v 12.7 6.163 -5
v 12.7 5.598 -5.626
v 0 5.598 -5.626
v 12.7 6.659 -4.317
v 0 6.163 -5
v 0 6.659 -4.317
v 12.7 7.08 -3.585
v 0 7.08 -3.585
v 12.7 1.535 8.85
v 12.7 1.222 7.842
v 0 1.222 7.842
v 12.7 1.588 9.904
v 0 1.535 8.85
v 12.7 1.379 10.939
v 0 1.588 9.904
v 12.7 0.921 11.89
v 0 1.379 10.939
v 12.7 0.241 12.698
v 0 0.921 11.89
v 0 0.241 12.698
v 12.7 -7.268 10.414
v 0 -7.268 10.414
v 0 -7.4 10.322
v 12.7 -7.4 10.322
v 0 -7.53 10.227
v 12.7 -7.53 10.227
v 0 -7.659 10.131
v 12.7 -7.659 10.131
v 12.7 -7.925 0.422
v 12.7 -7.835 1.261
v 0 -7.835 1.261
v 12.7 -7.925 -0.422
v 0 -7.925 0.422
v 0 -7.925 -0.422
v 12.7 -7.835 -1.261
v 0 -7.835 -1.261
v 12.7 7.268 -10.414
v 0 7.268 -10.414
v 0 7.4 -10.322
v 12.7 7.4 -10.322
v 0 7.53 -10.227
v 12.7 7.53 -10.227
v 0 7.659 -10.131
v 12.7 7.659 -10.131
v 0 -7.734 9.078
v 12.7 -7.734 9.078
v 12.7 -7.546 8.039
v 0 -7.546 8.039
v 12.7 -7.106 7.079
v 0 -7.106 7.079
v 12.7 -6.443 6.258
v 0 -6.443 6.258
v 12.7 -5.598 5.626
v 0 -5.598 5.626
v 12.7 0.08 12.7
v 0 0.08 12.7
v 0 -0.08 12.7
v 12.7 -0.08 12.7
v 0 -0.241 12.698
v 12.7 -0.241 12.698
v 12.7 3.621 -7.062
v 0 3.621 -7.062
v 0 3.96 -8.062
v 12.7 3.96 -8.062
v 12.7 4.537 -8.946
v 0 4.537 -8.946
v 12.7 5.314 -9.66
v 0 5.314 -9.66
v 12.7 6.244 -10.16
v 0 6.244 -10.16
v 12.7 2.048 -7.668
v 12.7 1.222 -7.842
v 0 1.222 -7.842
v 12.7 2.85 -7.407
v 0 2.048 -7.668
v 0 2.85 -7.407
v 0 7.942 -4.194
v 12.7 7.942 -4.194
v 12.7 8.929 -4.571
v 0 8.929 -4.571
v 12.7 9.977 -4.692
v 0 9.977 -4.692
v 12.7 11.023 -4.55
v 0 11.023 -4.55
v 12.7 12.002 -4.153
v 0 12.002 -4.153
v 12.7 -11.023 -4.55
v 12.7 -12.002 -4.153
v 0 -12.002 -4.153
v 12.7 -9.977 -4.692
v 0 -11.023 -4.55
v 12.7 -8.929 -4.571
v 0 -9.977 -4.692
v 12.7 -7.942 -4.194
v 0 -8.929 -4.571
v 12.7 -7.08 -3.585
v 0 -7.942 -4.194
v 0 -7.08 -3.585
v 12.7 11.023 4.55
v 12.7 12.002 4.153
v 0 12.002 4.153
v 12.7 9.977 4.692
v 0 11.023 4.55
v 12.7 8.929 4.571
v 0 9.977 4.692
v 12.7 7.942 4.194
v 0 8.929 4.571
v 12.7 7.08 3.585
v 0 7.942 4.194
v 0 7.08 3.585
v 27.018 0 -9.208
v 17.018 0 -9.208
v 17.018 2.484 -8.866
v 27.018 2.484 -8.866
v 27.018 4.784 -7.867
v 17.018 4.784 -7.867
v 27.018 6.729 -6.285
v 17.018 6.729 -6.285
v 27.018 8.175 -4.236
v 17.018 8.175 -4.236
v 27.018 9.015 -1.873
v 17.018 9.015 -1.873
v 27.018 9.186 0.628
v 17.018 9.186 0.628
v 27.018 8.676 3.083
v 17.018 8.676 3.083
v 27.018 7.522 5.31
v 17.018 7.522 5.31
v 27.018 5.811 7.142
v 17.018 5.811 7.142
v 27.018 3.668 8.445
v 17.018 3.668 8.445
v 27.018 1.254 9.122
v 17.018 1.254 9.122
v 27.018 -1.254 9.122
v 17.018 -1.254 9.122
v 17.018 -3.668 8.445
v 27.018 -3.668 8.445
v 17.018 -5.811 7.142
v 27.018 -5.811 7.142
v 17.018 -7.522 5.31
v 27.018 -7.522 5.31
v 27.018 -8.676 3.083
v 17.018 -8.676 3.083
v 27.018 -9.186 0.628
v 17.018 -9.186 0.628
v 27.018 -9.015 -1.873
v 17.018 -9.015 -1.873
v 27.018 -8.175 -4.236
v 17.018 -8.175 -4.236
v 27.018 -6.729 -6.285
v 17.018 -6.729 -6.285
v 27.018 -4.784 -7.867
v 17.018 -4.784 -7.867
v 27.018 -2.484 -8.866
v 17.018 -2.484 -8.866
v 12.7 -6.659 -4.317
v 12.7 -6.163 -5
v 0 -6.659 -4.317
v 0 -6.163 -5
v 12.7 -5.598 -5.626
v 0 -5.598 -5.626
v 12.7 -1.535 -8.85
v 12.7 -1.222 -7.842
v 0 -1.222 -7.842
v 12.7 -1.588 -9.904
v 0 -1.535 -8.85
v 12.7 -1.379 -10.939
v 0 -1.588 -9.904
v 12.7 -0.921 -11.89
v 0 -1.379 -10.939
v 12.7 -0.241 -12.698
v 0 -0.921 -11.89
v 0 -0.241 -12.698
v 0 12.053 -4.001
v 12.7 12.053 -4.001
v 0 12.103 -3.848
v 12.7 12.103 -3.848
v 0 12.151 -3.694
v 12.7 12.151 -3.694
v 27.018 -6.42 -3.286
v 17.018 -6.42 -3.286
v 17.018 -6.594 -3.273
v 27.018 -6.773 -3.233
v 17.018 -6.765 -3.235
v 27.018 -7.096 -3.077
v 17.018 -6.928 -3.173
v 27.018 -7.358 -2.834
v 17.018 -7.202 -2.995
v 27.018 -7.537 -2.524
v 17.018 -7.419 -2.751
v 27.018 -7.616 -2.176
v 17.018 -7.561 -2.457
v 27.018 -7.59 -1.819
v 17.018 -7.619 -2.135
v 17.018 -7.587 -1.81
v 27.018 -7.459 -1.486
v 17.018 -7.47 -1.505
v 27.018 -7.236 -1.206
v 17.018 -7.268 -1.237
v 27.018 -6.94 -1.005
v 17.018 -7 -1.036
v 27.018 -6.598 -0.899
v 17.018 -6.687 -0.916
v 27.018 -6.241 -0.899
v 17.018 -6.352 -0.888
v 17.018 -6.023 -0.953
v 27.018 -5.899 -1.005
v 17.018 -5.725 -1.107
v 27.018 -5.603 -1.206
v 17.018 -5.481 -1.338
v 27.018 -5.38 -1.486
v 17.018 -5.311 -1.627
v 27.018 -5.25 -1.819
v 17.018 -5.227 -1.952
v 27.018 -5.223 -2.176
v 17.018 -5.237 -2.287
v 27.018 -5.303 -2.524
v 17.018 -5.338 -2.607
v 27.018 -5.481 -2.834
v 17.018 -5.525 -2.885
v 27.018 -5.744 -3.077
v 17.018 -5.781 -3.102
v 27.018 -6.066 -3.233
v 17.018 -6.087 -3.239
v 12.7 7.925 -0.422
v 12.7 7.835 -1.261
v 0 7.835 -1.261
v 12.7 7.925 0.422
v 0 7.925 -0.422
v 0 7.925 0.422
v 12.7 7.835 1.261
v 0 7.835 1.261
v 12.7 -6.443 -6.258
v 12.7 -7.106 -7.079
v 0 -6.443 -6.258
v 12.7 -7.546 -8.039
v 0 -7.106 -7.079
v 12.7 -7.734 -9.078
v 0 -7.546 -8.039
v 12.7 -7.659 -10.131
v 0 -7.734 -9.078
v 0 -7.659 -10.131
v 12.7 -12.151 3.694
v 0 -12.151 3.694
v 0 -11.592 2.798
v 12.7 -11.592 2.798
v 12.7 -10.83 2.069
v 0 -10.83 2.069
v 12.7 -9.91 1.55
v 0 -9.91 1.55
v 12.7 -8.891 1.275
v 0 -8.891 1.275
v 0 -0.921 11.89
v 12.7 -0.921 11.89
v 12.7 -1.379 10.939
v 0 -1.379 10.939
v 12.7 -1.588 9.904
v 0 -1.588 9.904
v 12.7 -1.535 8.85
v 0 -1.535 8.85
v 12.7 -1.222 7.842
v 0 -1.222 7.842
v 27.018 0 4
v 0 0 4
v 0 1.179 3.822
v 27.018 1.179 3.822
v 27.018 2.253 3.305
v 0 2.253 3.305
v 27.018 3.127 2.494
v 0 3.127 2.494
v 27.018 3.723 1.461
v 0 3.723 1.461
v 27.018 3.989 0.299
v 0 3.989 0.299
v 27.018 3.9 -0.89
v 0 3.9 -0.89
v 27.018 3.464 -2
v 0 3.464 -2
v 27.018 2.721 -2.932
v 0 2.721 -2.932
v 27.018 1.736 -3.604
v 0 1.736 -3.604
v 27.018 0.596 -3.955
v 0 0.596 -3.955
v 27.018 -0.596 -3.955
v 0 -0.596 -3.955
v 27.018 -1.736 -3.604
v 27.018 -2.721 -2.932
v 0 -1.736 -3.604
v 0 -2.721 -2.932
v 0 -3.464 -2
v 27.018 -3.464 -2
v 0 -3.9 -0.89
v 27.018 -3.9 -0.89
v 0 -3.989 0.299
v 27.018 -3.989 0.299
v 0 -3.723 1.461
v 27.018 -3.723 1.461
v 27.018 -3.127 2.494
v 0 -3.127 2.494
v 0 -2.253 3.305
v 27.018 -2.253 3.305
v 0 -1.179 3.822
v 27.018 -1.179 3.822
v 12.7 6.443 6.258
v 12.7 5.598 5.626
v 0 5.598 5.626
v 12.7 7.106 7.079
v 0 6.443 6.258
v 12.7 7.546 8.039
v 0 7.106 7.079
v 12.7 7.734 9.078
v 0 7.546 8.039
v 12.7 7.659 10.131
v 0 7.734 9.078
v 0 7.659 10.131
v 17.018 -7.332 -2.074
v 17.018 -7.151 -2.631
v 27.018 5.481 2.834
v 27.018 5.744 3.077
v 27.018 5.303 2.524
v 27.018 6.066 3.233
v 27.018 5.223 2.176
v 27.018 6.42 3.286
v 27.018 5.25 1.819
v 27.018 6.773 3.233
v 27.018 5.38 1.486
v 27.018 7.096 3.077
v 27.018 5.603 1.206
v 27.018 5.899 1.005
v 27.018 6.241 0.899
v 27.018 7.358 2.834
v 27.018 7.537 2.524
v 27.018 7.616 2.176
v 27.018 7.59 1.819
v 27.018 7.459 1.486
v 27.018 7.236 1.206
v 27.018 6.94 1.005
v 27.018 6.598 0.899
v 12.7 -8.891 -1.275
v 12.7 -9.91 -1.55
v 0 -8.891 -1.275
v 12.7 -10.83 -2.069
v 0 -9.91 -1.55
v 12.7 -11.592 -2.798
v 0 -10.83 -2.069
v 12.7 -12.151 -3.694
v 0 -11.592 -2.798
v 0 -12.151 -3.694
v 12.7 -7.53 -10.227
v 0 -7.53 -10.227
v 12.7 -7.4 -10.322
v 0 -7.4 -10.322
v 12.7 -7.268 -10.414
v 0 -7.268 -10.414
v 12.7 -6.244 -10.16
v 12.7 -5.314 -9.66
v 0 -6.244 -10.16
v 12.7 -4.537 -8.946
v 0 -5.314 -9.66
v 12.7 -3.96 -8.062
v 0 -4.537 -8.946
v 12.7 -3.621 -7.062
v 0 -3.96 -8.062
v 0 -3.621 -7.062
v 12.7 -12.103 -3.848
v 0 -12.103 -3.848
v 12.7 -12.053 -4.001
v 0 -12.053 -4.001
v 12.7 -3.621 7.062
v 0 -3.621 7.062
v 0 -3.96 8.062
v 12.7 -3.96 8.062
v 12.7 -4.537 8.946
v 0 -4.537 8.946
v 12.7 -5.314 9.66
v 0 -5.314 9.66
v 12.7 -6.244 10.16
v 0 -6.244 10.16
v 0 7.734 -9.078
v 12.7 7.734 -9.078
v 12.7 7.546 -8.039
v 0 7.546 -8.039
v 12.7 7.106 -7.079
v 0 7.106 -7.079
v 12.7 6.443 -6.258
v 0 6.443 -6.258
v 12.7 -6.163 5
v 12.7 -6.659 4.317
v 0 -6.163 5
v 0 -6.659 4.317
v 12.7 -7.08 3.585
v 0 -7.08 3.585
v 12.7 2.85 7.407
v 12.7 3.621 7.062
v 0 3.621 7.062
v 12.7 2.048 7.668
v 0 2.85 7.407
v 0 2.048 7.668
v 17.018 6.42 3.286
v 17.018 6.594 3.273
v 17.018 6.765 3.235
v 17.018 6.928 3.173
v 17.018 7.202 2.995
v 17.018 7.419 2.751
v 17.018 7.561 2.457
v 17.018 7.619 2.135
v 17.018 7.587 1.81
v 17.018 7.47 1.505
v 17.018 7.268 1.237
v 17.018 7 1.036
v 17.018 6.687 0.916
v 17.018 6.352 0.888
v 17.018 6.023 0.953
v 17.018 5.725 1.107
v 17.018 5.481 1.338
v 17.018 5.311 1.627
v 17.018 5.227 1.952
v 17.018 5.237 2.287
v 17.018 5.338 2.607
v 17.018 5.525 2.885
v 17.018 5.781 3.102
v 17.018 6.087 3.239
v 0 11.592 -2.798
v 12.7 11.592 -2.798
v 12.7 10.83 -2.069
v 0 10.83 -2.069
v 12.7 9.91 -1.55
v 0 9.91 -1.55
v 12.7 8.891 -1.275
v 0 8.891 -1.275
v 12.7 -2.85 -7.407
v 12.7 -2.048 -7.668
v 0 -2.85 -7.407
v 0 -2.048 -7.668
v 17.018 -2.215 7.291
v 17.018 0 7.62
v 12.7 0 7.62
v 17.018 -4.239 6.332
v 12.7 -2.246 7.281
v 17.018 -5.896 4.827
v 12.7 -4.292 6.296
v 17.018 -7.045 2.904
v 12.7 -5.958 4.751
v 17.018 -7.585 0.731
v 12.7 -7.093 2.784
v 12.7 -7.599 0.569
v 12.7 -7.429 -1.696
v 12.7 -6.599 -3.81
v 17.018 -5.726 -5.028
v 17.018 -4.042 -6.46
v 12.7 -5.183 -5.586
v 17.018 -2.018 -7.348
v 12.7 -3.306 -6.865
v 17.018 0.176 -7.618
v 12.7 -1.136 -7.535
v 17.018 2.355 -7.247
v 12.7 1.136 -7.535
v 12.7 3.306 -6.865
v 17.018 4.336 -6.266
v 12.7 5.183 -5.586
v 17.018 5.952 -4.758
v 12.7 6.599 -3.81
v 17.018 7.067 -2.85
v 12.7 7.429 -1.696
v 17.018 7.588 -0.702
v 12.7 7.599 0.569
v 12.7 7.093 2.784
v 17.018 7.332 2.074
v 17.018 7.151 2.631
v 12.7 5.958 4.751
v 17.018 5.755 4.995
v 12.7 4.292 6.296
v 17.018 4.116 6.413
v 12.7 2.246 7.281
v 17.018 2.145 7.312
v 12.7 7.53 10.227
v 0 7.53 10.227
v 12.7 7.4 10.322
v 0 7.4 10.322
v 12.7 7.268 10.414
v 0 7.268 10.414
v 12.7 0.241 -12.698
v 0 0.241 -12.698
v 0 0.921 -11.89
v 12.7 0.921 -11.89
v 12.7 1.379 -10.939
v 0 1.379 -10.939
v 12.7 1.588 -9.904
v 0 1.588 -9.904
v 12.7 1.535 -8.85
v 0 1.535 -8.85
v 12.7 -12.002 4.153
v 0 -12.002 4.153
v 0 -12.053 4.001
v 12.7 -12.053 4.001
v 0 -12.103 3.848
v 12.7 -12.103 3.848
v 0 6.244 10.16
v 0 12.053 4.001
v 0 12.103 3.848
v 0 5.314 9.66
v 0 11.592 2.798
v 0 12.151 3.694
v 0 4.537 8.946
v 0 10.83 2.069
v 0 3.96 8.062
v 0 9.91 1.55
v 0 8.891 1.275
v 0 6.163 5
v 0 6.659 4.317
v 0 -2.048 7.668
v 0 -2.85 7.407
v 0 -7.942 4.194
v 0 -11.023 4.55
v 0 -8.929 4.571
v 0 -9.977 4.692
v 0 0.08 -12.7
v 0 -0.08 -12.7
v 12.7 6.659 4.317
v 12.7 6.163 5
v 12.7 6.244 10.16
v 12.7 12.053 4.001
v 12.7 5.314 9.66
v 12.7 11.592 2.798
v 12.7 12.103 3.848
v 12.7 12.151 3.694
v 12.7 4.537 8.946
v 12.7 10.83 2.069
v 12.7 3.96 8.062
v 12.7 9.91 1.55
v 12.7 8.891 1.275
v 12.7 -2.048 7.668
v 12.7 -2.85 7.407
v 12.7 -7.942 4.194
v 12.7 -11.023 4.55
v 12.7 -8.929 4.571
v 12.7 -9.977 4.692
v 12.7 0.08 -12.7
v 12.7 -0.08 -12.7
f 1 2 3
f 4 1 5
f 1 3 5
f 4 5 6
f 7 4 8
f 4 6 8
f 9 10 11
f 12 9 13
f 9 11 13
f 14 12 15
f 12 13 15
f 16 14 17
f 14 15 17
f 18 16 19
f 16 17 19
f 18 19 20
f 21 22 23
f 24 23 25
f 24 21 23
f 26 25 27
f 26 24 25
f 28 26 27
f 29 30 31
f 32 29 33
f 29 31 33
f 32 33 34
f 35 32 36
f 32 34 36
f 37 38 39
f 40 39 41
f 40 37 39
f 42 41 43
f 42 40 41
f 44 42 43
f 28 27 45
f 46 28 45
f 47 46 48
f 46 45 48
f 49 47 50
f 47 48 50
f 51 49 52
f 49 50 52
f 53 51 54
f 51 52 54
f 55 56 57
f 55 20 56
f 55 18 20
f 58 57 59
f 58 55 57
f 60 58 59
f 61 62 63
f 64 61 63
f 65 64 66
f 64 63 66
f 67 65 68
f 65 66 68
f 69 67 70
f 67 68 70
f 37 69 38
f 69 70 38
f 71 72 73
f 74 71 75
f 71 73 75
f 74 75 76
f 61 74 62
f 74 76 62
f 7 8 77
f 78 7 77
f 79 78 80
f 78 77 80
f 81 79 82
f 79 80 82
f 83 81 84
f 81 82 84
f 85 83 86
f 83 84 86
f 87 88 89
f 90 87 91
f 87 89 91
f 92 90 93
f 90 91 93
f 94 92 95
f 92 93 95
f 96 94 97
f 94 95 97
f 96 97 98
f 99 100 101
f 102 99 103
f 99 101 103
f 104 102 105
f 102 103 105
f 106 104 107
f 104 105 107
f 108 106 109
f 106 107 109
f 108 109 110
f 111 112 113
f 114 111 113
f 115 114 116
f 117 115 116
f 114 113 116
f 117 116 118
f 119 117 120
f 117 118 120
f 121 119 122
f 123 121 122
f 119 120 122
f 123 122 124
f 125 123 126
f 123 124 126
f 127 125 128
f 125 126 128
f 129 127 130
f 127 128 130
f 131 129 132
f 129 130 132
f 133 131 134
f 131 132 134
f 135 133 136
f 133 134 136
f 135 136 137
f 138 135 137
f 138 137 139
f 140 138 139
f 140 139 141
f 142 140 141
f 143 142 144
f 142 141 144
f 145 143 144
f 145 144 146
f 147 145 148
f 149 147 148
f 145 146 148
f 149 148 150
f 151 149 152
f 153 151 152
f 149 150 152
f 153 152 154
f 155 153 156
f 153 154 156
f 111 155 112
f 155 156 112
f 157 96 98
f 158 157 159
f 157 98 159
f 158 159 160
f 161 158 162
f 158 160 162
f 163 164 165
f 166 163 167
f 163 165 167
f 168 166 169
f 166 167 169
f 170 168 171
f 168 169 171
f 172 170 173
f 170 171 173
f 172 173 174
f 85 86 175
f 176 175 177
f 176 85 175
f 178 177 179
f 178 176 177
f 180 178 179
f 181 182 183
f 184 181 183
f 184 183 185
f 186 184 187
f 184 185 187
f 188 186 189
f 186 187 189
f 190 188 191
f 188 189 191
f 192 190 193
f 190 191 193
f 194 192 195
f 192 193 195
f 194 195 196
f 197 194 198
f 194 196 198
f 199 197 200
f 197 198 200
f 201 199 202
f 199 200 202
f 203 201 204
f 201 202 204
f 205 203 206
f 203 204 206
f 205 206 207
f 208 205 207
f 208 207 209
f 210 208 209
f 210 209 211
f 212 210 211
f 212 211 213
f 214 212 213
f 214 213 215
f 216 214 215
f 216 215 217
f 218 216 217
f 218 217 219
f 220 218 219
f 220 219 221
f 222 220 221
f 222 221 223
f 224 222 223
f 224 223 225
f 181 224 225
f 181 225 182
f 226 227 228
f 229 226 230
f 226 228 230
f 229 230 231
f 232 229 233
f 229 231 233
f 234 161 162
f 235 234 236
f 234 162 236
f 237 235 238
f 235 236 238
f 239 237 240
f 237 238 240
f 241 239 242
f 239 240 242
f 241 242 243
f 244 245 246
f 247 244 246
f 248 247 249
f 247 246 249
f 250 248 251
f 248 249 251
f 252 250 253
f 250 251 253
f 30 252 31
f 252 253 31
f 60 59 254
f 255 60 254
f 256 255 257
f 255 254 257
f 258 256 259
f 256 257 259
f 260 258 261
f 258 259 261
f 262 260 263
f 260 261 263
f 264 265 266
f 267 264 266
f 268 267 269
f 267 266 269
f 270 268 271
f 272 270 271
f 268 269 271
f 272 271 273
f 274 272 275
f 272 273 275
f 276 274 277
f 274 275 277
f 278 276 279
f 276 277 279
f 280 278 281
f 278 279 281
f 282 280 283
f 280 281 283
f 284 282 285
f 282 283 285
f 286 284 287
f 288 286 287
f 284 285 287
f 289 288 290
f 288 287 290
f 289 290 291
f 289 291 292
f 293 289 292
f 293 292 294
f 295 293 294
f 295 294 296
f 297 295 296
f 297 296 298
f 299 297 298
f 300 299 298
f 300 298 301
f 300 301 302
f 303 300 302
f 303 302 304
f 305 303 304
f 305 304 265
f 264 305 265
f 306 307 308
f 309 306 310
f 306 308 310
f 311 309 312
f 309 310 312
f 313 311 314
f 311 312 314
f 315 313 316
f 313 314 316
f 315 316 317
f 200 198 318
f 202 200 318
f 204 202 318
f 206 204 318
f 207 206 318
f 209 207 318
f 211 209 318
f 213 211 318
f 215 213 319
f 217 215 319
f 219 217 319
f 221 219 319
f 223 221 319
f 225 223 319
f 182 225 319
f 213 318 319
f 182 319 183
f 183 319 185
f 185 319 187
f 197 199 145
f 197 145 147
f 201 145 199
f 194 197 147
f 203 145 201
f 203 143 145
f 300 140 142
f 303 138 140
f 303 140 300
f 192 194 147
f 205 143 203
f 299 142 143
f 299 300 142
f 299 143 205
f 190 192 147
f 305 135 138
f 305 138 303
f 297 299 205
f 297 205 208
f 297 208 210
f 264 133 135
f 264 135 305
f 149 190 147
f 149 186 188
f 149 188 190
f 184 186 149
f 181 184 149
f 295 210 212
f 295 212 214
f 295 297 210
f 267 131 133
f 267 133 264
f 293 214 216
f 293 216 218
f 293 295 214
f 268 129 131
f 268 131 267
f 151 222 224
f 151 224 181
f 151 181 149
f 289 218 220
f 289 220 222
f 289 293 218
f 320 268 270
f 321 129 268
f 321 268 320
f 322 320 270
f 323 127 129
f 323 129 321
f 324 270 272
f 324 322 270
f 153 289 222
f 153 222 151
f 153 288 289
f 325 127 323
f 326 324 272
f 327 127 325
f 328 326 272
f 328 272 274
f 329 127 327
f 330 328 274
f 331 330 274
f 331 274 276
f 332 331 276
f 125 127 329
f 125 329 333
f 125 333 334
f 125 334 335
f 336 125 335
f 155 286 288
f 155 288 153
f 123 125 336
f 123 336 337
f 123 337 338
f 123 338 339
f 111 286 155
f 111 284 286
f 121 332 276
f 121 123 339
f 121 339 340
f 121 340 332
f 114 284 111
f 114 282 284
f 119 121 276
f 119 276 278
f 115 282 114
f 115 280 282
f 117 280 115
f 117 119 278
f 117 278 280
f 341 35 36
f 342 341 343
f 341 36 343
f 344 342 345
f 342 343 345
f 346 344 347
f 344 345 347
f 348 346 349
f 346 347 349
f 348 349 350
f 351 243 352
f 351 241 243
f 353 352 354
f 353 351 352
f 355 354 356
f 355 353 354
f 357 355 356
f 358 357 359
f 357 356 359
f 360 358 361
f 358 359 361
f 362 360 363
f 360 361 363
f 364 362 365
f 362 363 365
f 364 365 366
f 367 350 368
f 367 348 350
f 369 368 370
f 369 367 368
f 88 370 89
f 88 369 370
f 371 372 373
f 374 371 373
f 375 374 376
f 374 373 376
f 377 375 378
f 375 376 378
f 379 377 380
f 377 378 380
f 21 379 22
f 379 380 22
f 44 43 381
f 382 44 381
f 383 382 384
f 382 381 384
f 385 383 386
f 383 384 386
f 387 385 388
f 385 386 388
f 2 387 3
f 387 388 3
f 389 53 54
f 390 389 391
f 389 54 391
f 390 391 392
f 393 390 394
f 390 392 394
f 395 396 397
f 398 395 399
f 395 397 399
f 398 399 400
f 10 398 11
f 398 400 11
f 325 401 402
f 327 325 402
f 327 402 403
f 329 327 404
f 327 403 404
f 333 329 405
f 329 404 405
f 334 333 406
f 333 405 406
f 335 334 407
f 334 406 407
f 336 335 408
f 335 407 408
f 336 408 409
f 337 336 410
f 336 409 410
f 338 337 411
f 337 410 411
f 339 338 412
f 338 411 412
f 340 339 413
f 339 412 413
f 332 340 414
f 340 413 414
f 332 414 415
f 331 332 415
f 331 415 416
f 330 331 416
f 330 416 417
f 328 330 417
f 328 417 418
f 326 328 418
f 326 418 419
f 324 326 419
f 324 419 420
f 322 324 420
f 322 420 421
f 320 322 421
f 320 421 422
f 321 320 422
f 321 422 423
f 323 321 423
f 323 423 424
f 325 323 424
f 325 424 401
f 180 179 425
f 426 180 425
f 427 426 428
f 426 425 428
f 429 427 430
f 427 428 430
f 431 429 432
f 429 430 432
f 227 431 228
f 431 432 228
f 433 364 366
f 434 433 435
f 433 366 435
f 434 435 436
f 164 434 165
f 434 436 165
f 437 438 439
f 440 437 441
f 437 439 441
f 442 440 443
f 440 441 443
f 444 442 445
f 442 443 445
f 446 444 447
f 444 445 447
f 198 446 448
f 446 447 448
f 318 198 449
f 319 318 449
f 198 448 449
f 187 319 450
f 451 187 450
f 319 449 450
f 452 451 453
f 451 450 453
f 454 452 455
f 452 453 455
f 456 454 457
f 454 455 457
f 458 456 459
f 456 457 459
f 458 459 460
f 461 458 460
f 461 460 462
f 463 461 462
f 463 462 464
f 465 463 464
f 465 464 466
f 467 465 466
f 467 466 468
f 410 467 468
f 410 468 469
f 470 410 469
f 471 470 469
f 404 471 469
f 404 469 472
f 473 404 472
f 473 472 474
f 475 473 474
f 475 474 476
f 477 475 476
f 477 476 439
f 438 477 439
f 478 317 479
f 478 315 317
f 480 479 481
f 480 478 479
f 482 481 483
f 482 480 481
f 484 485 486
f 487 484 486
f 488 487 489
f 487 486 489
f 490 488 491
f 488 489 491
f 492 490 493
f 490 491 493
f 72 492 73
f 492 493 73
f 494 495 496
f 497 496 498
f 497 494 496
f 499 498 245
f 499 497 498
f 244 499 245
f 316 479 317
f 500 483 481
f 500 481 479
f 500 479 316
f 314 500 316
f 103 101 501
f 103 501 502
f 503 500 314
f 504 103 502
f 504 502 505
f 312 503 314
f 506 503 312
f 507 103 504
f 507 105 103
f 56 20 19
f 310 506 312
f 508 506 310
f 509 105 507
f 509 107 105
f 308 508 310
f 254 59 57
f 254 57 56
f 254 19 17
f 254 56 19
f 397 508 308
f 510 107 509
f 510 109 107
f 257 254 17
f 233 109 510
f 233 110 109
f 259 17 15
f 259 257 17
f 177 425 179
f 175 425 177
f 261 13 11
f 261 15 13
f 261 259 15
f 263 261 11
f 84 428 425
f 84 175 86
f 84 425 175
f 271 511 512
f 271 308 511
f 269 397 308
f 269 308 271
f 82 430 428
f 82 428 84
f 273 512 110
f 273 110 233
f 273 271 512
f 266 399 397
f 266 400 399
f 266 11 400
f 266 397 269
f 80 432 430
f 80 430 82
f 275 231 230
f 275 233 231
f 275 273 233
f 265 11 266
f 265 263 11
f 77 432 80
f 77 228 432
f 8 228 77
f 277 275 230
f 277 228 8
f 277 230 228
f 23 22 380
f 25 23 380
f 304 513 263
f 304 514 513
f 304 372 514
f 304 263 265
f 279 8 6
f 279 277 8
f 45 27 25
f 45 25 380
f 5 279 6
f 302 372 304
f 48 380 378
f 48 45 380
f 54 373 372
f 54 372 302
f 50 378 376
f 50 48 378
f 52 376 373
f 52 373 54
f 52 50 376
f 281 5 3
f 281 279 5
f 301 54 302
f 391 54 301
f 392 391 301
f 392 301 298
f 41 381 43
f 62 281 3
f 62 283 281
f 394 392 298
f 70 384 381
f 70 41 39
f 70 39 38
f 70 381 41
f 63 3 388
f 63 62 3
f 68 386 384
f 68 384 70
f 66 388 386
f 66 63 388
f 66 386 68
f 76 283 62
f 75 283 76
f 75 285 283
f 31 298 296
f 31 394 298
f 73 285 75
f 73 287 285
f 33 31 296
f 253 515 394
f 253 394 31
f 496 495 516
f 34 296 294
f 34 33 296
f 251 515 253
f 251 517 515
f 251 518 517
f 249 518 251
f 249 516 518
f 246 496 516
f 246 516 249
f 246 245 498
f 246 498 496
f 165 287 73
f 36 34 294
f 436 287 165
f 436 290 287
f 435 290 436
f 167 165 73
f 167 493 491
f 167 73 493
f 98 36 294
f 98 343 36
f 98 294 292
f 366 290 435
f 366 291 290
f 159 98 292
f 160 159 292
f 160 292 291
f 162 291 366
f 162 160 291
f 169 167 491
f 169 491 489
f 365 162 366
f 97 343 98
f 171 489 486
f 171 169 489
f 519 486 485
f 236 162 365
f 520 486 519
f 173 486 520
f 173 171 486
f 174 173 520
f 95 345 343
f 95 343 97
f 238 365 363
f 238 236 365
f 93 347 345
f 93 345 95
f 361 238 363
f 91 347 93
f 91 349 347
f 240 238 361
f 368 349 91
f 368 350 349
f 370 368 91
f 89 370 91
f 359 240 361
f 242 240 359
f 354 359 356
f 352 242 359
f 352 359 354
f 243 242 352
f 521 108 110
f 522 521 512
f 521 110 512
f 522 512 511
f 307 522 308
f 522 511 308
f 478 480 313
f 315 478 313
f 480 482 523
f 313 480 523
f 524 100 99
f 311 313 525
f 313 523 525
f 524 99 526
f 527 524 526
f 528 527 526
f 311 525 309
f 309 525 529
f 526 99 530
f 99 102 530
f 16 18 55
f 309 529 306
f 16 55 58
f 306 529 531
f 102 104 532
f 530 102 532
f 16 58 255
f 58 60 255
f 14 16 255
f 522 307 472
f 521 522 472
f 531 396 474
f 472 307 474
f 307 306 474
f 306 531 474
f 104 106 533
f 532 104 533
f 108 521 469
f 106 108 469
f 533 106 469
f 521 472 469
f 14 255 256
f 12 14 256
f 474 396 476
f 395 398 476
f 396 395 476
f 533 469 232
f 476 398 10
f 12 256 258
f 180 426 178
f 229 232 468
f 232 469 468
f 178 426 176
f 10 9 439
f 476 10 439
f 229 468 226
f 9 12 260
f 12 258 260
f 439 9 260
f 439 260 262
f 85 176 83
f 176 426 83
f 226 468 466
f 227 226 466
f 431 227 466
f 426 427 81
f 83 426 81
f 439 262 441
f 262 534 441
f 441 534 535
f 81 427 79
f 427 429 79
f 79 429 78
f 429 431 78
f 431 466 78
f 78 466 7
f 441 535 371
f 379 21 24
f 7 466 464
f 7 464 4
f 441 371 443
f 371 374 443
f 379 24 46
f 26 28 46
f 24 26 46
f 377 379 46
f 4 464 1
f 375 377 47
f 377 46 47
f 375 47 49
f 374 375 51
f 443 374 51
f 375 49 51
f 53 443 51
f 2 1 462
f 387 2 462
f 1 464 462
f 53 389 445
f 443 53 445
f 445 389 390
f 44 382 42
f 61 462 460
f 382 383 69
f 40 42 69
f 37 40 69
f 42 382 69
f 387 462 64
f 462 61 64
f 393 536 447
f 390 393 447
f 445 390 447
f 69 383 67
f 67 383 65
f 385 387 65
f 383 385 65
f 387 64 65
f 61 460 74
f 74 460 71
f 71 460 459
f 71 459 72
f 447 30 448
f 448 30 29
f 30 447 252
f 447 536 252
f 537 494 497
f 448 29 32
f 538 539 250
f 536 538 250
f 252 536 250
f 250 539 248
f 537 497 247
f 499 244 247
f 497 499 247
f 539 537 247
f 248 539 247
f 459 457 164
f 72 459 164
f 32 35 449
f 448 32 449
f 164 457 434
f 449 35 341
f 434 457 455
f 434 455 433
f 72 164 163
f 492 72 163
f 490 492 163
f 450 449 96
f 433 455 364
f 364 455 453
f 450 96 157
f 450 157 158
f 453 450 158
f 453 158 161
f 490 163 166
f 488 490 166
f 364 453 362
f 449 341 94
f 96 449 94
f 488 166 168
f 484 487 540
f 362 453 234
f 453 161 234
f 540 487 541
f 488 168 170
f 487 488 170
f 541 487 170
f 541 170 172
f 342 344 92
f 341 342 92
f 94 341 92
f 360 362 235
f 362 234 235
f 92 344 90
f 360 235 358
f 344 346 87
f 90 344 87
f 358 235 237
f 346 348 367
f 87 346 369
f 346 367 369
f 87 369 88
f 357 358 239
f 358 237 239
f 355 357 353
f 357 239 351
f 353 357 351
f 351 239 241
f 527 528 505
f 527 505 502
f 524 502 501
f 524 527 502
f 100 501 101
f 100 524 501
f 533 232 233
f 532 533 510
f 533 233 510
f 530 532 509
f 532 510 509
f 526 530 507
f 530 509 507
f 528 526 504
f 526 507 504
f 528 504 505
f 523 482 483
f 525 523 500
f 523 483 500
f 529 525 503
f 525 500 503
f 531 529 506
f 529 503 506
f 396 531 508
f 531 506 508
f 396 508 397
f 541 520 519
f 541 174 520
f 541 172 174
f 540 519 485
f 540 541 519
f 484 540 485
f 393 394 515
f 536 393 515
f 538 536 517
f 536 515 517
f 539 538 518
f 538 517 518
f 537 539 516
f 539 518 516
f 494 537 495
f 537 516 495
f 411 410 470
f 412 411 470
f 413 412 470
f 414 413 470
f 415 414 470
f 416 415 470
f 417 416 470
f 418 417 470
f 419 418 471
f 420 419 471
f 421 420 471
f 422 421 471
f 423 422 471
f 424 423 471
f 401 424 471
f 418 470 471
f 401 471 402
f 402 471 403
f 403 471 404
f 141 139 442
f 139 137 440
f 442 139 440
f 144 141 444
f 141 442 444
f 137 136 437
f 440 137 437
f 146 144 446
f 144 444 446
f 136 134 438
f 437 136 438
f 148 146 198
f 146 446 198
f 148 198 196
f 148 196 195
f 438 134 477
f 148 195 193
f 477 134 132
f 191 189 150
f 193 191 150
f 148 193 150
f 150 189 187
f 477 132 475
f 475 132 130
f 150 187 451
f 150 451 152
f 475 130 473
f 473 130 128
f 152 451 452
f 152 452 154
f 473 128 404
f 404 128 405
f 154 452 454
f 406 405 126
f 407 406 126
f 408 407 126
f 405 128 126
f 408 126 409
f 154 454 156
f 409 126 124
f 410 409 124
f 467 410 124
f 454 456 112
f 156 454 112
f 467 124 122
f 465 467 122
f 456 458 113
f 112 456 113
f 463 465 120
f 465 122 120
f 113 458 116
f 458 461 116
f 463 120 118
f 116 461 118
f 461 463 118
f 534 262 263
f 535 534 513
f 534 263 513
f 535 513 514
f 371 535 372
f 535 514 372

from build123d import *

# Parameters (mm, degrees)
BASPROSKE_W              = 12.7
BASPROSKE_H              = 12.7
TOOTHCUT_DEPTH           = 22.997045256
TEETHCUTS_COUNT          = 10
SKETCH15_R               = 7.62
BOSS_EXTRUDE2_DEPTH      = 4.318
SKETCH8_R                = 9.2075
BOSS_EXTRUDE1_DEPTH      = 10
M2_CLEARANCE_HOLE1_D     = 2.4
M2_CLEARANCE_HOLE1_DEPTH = 10
CIRPATTERN1_COUNT        = 4
SKETCH13_R               = 4
CUT_EXTRUDE1_DEPTH       = 33.232032369
CUT_EXTRUDE1_DEPTH_BACK  = 33.232032369


with BuildPart() as part:
    # BasProSke → Base-Revolve (revolve)
    with BuildSketch(Plane(origin=(0, 0, 0), x_dir=(1, 0, 0), z_dir=(0, 1, 0)), mode=Mode.PRIVATE) as base_revolve_sk:
        with Locations((6.35, 6.35)):
            Rectangle(BASPROSKE_W, BASPROSKE_H)
    revolve(base_revolve_sk.sketch.rotate(Axis((-10, 0, 0), (1, 0, 0)), 180), axis=Axis((-10, 0, 0), (1, 0, 0)))

    # TooCutSke → ToothCut (cut, through all)
    with BuildSketch(Plane(origin=(0, 0, 0), x_dir=(0, 0, -1), z_dir=(1, 0, 0))):
        with BuildLine():
            ThreePointArc((1.261053733, 7.835399804), (0, 7.93623), (-1.261053733, 7.835399804))
            ThreePointArc((-1.261053733, 7.835399804), (-1.789991322, 10.402889218), (-3.729263267, 12.166692264))
            ThreePointArc((-3.729263267, 12.166692264), (0, 12.7254), (3.729263267, 12.166692264))
            ThreePointArc((3.729263267, 12.166692264), (1.789991322, 10.402889218), (1.261053733, 7.835399804))
        make_face()
    toothcut = extrude(amount=TOOTHCUT_DEPTH, mode=Mode.SUBTRACT)

    # TeethCuts: ToothCut ×10 about axis
    teethcuts_axis = Axis((0, 0, 0), (1, 0, 0))
    for i in range(1, TEETHCUTS_COUNT):
        add(toothcut.rotate(teethcuts_axis, i * 360 / TEETHCUTS_COUNT), mode=Mode.SUBTRACT)

    # Sketch15 → Boss-Extrude2 (add)
    with BuildSketch(Plane(origin=(12.7, 0, 0), x_dir=(0, 0, -1), z_dir=(1, 0, 0))):
        with Locations(Location((0, 0, 0), (0, 0, 180))):
            Circle(SKETCH15_R)
    extrude(amount=BOSS_EXTRUDE2_DEPTH)

    # Sketch8 → Boss-Extrude1 (add)
    with BuildSketch(Plane(origin=(17.018, 0, 0), x_dir=(0, 0, -1), z_dir=(1, 0, 0))):
        Circle(SKETCH8_R)
    extrude(amount=BOSS_EXTRUDE1_DEPTH)

    # M2 Clearance Hole1
    with Locations(Plane(origin=(27.018, 0, 0), x_dir=(0, 0, -1), z_dir=(1, 0, 0))):
        with Locations((-2.085864712, 6.419631485)):
            m2_clearance_hole1 = Hole(M2_CLEARANCE_HOLE1_D / 2, depth=M2_CLEARANCE_HOLE1_DEPTH)

    # CirPattern1: M2 Clearance Hole1 ×4 about axis, 2 skipped
    cirpattern1_axis = Axis((27.018, 0, 0), (-1, 0, 0))
    add([m2_clearance_hole1.rotate(cirpattern1_axis, i * 360 / CIRPATTERN1_COUNT) for i in range(1, CIRPATTERN1_COUNT) if i not in (1, 3)], mode=Mode.SUBTRACT)

    # Sketch13 → Cut-Extrude1 (cut, two sides)
    with BuildSketch(Plane.ZY) as cut_extrude1_sk:
        Circle(SKETCH13_R)
    extrude(amount=CUT_EXTRUDE1_DEPTH, mode=Mode.SUBTRACT)
    extrude(cut_extrude1_sk.sketch, amount=-CUT_EXTRUDE1_DEPTH_BACK, mode=Mode.SUBTRACT)


solid = part.part
